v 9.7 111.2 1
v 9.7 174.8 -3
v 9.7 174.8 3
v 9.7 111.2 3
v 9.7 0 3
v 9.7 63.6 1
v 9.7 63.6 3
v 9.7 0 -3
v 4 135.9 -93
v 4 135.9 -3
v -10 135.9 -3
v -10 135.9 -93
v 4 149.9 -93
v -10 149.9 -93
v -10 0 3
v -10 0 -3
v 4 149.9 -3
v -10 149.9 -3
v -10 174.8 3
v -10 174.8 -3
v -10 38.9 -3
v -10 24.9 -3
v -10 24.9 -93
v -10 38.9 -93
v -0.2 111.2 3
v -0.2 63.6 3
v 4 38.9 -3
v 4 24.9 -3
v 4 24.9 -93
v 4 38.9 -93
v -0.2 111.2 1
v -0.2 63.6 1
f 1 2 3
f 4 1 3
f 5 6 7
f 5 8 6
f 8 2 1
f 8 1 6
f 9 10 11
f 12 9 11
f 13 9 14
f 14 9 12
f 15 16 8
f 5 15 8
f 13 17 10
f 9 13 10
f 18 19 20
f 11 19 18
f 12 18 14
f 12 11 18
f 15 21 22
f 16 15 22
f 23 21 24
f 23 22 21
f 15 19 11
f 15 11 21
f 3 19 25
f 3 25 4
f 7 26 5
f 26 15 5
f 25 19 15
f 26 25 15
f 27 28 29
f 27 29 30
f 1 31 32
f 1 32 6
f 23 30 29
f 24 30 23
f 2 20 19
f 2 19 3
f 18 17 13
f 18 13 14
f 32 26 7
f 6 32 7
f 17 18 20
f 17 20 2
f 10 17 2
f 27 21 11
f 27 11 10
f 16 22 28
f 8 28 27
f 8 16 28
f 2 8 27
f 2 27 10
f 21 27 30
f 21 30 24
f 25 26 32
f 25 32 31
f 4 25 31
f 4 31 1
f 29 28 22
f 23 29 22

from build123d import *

# Parameters (mm, degrees)
SKETCH1_W           = 20
SKETCH1_H           = 6
BOSS_EXTRUDE1_DEPTH = 174.8
SKETCH2_W           = 20.4
SKETCH2_H           = 47.6
CUT_EXTRUDE1_DEPTH  = 2
SKETCH3_W           = 14
SKETCH3_H           = 14
BOSS_EXTRUDE2_DEPTH = 90
SKETCH4_W           = 0.3
SKETCH4_H           = 6
CUT_EXTRUDE2_DEPTH  = 175


with BuildPart() as part:
    # Sketch1 → Boss-Extrude1 (new body)
    with BuildSketch(Plane(origin=(0, 0, 0), x_dir=(1, 0, 0), z_dir=(0, 1, 0))):
        Rectangle(SKETCH1_W, SKETCH1_H)
    extrude(amount=BOSS_EXTRUDE1_DEPTH)

    # Sketch2 → Cut-Extrude1 (cut)
    with BuildSketch(Plane.XY.offset(3)):
        with Locations((10, 87.4)):
            Rectangle(SKETCH2_W, SKETCH2_H)
    extrude(amount=-CUT_EXTRUDE1_DEPTH, mode=Mode.SUBTRACT)

    # Sketch3 → Boss-Extrude2 (add)
    with BuildSketch(Plane(origin=(0, 0, -3), x_dir=(-1, 0, 0), z_dir=(0, 0, -1))):
        with Locations((3, 31.9)):
            Rectangle(SKETCH3_W, SKETCH3_H)
    boss_extrude2 = extrude(amount=BOSS_EXTRUDE2_DEPTH)

    # Mirror1: Boss-Extrude2 across plane
    add(boss_extrude2.mirror(Plane.ZX.offset(87.4)))

    # Sketch4 → Cut-Extrude2 (cut)
    with BuildSketch(Plane.XZ):
        with Locations((9.85, 0)):
            Rectangle(SKETCH4_W, SKETCH4_H)
    extrude(amount=-CUT_EXTRUDE2_DEPTH, mode=Mode.SUBTRACT)


solid = part.part
